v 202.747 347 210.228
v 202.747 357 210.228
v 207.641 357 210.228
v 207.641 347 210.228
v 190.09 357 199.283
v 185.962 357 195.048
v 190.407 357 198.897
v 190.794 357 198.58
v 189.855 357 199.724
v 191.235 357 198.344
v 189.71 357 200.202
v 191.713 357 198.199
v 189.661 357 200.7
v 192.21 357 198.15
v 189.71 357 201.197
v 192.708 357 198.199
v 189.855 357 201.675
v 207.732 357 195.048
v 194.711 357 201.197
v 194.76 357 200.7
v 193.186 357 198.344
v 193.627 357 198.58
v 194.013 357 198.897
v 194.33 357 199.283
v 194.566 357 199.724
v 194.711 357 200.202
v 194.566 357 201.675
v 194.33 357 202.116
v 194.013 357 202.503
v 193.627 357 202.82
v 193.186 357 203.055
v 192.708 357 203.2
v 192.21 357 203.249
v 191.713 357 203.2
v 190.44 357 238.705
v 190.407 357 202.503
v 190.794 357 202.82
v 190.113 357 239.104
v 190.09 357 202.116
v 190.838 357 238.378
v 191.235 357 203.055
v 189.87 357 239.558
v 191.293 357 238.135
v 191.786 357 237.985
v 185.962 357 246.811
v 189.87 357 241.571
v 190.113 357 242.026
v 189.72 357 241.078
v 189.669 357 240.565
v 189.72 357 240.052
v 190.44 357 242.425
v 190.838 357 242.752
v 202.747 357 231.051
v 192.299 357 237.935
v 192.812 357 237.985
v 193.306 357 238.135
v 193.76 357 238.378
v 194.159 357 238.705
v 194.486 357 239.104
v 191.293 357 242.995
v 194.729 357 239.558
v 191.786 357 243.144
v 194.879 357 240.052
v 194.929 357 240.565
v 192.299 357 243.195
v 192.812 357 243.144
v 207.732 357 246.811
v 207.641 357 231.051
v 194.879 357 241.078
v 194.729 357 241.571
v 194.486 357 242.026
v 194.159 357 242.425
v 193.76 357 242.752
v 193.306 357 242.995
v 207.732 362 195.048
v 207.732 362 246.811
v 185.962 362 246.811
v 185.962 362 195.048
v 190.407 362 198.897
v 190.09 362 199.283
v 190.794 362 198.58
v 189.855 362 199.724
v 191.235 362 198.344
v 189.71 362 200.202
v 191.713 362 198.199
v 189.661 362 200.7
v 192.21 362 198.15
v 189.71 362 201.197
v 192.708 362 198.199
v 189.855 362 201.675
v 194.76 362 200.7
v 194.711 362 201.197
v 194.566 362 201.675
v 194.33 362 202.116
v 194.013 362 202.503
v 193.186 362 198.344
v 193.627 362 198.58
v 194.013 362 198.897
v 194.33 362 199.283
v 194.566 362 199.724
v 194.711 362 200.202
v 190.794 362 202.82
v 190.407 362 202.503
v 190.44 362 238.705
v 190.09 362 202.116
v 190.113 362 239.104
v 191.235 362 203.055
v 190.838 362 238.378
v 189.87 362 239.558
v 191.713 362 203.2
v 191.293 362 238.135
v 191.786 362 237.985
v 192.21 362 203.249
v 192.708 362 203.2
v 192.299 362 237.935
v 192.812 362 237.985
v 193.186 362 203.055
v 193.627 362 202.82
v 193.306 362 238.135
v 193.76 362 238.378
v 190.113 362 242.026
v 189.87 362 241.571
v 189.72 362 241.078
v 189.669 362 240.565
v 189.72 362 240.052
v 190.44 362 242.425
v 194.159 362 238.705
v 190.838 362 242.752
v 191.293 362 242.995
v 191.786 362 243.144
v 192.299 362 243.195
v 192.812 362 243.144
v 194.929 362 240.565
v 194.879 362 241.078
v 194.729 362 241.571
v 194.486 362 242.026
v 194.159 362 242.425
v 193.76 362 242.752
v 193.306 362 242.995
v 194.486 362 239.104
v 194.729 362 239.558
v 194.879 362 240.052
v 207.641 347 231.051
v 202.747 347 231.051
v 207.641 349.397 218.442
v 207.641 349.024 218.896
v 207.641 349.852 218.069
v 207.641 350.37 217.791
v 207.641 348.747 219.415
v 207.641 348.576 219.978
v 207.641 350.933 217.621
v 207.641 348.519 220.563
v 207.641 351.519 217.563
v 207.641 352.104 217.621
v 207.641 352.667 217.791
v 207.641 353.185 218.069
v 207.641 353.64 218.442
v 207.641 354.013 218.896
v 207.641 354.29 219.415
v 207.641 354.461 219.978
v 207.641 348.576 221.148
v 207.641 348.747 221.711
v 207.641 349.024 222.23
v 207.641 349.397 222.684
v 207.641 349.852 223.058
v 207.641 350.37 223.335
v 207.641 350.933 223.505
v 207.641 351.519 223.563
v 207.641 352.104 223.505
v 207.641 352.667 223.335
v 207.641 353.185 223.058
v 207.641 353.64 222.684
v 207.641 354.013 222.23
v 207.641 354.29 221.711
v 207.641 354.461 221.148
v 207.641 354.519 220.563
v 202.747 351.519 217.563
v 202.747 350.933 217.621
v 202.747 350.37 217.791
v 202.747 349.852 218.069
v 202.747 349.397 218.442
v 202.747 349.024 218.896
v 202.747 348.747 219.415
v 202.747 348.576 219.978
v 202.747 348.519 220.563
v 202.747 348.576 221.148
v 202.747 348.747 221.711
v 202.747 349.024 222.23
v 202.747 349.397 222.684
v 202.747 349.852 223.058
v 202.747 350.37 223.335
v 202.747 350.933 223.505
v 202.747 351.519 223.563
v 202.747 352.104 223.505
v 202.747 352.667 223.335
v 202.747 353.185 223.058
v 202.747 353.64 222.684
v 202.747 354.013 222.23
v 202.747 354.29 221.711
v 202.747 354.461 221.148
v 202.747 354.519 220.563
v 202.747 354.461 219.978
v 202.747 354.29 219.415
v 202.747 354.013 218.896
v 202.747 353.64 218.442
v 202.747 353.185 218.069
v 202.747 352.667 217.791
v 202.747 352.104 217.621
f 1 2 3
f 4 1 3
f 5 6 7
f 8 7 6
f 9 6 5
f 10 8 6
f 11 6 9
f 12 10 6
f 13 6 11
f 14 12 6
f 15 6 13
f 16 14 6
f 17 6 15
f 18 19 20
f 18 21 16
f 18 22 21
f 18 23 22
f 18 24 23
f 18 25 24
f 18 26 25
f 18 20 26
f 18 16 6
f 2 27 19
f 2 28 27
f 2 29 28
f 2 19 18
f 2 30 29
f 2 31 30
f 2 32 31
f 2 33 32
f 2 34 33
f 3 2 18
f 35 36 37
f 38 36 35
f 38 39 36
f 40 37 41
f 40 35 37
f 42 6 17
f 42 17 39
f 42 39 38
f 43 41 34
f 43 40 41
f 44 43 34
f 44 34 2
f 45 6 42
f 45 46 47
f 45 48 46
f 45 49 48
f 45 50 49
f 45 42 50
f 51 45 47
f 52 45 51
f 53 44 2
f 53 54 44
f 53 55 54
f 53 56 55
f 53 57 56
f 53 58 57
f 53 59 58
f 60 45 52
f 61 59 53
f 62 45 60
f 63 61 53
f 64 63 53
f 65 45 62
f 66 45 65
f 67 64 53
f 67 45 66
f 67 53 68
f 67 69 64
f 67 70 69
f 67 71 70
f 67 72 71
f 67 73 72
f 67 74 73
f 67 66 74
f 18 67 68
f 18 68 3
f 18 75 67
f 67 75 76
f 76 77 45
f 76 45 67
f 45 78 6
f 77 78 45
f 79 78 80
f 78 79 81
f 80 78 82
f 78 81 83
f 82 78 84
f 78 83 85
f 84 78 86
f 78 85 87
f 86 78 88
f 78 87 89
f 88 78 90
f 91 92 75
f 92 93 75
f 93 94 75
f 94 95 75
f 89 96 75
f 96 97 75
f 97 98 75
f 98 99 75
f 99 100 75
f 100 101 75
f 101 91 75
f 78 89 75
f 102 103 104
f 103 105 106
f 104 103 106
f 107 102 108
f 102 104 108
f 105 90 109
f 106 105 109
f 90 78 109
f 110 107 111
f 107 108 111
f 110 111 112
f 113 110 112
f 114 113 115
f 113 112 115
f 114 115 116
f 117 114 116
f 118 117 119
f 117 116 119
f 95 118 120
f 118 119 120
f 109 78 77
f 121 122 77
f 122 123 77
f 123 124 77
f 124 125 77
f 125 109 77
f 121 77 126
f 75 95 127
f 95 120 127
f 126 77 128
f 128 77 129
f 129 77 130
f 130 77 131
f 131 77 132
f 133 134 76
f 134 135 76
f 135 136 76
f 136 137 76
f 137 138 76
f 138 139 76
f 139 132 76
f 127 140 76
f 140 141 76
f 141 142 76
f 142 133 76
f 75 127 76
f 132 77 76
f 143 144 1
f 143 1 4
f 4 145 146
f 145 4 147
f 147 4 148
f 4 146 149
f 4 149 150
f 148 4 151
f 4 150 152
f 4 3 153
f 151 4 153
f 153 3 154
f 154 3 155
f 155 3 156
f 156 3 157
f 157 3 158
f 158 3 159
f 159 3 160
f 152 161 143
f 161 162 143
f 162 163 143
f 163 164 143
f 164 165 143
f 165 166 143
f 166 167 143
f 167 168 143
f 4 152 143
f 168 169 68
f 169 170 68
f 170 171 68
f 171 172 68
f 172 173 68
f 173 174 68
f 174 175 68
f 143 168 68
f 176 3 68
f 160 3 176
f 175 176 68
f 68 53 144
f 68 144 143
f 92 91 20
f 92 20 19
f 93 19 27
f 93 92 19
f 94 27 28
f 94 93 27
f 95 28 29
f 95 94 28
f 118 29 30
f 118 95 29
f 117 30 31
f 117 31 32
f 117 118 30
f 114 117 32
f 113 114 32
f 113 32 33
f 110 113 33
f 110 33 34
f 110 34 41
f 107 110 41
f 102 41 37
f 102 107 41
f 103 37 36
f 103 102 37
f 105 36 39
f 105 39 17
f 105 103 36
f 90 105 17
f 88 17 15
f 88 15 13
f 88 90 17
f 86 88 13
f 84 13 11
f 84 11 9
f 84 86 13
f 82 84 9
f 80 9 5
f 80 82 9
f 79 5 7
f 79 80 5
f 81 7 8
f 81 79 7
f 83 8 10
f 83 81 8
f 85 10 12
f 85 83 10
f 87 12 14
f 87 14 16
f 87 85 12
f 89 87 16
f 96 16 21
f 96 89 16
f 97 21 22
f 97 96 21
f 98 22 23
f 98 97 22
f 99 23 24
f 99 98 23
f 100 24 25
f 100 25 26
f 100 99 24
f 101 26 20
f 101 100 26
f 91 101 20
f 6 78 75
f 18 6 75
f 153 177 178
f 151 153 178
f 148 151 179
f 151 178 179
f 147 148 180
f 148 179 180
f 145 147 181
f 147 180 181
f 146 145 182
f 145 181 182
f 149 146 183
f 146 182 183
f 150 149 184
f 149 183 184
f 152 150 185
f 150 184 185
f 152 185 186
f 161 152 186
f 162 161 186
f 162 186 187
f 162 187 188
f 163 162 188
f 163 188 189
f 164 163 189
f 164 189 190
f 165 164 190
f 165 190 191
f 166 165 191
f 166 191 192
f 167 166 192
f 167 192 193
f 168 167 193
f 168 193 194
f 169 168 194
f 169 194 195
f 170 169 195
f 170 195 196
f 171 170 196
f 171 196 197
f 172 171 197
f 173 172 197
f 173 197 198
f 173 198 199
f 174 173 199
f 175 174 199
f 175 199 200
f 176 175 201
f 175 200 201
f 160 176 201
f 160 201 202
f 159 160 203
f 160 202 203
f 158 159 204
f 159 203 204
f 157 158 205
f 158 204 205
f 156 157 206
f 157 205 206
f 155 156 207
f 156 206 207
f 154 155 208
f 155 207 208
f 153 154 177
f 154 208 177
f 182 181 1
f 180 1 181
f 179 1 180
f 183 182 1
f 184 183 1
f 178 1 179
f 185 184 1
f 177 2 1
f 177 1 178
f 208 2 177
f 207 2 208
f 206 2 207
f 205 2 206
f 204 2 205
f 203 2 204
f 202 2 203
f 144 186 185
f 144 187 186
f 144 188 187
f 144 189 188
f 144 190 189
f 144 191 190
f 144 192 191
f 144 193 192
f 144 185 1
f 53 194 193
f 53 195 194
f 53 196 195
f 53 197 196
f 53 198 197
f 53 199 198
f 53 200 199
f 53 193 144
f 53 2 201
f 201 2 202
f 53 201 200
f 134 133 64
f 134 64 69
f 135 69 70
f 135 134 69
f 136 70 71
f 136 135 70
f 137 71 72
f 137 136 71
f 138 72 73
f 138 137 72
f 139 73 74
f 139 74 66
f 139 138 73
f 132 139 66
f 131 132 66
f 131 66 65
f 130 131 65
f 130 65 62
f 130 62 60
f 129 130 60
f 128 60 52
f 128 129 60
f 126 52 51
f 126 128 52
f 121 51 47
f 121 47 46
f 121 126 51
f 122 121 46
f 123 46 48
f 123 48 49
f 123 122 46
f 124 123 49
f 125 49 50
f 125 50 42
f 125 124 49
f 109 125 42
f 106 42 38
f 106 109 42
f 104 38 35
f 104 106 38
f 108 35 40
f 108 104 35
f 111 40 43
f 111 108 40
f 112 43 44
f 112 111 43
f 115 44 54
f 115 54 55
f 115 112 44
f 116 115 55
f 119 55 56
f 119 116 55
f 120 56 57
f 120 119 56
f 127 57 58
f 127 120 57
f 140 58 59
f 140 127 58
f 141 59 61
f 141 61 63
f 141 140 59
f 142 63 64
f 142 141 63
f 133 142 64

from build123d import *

# Parameters (mm, degrees)
SKETCH143_W     = 21.769744
SKETCH143_H     = 51.763626
SKETCH143_R     = 2.629917
SKETCH143_R_2   = 2.549682
PAD053_DEPTH    = 5
SKETCH142_W     = 4.89418
SKETCH142_H     = 20.822479
PAD052_DEPTH    = 10
SKETCH141_R     = 3
POCKET084_DEPTH = 5


with BuildPart() as part:
    # Sketch143 → Pad053 (new body)
    with BuildSketch(Plane(origin=(195, 362, 200), x_dir=(1, 0, 0), z_dir=(0, -1, 0))):
        with Locations((1.846756, 20.929451)):
            Rectangle(SKETCH143_W, SKETCH143_H)
        with Locations((-2.70076, 40.56488)):
            Circle(SKETCH143_R, mode=Mode.SUBTRACT)
        with Locations((-2.789749, 0.699631)):
            Circle(SKETCH143_R_2, mode=Mode.SUBTRACT)
    extrude(amount=PAD053_DEPTH)

    # Sketch142 → Pad052 (new body)
    with BuildSketch(Plane(origin=(195, 357, 200), x_dir=(1, 0, 0), z_dir=(0, -1, 0))):
        with Locations((10.193657, 20.639526)):
            Rectangle(SKETCH142_W, SKETCH142_H)
    extrude(amount=PAD052_DEPTH)

    # Sketch141 → Pocket084 (cut)
    with BuildSketch(Plane(origin=(202.746567, 362, 200), x_dir=(0, 0, -1), z_dir=(-1, 0, 0))):
        with Locations((-20.563114, 10.481458)):
            Circle(SKETCH141_R)
    extrude(amount=-POCKET084_DEPTH, mode=Mode.SUBTRACT)


solid = part.part
